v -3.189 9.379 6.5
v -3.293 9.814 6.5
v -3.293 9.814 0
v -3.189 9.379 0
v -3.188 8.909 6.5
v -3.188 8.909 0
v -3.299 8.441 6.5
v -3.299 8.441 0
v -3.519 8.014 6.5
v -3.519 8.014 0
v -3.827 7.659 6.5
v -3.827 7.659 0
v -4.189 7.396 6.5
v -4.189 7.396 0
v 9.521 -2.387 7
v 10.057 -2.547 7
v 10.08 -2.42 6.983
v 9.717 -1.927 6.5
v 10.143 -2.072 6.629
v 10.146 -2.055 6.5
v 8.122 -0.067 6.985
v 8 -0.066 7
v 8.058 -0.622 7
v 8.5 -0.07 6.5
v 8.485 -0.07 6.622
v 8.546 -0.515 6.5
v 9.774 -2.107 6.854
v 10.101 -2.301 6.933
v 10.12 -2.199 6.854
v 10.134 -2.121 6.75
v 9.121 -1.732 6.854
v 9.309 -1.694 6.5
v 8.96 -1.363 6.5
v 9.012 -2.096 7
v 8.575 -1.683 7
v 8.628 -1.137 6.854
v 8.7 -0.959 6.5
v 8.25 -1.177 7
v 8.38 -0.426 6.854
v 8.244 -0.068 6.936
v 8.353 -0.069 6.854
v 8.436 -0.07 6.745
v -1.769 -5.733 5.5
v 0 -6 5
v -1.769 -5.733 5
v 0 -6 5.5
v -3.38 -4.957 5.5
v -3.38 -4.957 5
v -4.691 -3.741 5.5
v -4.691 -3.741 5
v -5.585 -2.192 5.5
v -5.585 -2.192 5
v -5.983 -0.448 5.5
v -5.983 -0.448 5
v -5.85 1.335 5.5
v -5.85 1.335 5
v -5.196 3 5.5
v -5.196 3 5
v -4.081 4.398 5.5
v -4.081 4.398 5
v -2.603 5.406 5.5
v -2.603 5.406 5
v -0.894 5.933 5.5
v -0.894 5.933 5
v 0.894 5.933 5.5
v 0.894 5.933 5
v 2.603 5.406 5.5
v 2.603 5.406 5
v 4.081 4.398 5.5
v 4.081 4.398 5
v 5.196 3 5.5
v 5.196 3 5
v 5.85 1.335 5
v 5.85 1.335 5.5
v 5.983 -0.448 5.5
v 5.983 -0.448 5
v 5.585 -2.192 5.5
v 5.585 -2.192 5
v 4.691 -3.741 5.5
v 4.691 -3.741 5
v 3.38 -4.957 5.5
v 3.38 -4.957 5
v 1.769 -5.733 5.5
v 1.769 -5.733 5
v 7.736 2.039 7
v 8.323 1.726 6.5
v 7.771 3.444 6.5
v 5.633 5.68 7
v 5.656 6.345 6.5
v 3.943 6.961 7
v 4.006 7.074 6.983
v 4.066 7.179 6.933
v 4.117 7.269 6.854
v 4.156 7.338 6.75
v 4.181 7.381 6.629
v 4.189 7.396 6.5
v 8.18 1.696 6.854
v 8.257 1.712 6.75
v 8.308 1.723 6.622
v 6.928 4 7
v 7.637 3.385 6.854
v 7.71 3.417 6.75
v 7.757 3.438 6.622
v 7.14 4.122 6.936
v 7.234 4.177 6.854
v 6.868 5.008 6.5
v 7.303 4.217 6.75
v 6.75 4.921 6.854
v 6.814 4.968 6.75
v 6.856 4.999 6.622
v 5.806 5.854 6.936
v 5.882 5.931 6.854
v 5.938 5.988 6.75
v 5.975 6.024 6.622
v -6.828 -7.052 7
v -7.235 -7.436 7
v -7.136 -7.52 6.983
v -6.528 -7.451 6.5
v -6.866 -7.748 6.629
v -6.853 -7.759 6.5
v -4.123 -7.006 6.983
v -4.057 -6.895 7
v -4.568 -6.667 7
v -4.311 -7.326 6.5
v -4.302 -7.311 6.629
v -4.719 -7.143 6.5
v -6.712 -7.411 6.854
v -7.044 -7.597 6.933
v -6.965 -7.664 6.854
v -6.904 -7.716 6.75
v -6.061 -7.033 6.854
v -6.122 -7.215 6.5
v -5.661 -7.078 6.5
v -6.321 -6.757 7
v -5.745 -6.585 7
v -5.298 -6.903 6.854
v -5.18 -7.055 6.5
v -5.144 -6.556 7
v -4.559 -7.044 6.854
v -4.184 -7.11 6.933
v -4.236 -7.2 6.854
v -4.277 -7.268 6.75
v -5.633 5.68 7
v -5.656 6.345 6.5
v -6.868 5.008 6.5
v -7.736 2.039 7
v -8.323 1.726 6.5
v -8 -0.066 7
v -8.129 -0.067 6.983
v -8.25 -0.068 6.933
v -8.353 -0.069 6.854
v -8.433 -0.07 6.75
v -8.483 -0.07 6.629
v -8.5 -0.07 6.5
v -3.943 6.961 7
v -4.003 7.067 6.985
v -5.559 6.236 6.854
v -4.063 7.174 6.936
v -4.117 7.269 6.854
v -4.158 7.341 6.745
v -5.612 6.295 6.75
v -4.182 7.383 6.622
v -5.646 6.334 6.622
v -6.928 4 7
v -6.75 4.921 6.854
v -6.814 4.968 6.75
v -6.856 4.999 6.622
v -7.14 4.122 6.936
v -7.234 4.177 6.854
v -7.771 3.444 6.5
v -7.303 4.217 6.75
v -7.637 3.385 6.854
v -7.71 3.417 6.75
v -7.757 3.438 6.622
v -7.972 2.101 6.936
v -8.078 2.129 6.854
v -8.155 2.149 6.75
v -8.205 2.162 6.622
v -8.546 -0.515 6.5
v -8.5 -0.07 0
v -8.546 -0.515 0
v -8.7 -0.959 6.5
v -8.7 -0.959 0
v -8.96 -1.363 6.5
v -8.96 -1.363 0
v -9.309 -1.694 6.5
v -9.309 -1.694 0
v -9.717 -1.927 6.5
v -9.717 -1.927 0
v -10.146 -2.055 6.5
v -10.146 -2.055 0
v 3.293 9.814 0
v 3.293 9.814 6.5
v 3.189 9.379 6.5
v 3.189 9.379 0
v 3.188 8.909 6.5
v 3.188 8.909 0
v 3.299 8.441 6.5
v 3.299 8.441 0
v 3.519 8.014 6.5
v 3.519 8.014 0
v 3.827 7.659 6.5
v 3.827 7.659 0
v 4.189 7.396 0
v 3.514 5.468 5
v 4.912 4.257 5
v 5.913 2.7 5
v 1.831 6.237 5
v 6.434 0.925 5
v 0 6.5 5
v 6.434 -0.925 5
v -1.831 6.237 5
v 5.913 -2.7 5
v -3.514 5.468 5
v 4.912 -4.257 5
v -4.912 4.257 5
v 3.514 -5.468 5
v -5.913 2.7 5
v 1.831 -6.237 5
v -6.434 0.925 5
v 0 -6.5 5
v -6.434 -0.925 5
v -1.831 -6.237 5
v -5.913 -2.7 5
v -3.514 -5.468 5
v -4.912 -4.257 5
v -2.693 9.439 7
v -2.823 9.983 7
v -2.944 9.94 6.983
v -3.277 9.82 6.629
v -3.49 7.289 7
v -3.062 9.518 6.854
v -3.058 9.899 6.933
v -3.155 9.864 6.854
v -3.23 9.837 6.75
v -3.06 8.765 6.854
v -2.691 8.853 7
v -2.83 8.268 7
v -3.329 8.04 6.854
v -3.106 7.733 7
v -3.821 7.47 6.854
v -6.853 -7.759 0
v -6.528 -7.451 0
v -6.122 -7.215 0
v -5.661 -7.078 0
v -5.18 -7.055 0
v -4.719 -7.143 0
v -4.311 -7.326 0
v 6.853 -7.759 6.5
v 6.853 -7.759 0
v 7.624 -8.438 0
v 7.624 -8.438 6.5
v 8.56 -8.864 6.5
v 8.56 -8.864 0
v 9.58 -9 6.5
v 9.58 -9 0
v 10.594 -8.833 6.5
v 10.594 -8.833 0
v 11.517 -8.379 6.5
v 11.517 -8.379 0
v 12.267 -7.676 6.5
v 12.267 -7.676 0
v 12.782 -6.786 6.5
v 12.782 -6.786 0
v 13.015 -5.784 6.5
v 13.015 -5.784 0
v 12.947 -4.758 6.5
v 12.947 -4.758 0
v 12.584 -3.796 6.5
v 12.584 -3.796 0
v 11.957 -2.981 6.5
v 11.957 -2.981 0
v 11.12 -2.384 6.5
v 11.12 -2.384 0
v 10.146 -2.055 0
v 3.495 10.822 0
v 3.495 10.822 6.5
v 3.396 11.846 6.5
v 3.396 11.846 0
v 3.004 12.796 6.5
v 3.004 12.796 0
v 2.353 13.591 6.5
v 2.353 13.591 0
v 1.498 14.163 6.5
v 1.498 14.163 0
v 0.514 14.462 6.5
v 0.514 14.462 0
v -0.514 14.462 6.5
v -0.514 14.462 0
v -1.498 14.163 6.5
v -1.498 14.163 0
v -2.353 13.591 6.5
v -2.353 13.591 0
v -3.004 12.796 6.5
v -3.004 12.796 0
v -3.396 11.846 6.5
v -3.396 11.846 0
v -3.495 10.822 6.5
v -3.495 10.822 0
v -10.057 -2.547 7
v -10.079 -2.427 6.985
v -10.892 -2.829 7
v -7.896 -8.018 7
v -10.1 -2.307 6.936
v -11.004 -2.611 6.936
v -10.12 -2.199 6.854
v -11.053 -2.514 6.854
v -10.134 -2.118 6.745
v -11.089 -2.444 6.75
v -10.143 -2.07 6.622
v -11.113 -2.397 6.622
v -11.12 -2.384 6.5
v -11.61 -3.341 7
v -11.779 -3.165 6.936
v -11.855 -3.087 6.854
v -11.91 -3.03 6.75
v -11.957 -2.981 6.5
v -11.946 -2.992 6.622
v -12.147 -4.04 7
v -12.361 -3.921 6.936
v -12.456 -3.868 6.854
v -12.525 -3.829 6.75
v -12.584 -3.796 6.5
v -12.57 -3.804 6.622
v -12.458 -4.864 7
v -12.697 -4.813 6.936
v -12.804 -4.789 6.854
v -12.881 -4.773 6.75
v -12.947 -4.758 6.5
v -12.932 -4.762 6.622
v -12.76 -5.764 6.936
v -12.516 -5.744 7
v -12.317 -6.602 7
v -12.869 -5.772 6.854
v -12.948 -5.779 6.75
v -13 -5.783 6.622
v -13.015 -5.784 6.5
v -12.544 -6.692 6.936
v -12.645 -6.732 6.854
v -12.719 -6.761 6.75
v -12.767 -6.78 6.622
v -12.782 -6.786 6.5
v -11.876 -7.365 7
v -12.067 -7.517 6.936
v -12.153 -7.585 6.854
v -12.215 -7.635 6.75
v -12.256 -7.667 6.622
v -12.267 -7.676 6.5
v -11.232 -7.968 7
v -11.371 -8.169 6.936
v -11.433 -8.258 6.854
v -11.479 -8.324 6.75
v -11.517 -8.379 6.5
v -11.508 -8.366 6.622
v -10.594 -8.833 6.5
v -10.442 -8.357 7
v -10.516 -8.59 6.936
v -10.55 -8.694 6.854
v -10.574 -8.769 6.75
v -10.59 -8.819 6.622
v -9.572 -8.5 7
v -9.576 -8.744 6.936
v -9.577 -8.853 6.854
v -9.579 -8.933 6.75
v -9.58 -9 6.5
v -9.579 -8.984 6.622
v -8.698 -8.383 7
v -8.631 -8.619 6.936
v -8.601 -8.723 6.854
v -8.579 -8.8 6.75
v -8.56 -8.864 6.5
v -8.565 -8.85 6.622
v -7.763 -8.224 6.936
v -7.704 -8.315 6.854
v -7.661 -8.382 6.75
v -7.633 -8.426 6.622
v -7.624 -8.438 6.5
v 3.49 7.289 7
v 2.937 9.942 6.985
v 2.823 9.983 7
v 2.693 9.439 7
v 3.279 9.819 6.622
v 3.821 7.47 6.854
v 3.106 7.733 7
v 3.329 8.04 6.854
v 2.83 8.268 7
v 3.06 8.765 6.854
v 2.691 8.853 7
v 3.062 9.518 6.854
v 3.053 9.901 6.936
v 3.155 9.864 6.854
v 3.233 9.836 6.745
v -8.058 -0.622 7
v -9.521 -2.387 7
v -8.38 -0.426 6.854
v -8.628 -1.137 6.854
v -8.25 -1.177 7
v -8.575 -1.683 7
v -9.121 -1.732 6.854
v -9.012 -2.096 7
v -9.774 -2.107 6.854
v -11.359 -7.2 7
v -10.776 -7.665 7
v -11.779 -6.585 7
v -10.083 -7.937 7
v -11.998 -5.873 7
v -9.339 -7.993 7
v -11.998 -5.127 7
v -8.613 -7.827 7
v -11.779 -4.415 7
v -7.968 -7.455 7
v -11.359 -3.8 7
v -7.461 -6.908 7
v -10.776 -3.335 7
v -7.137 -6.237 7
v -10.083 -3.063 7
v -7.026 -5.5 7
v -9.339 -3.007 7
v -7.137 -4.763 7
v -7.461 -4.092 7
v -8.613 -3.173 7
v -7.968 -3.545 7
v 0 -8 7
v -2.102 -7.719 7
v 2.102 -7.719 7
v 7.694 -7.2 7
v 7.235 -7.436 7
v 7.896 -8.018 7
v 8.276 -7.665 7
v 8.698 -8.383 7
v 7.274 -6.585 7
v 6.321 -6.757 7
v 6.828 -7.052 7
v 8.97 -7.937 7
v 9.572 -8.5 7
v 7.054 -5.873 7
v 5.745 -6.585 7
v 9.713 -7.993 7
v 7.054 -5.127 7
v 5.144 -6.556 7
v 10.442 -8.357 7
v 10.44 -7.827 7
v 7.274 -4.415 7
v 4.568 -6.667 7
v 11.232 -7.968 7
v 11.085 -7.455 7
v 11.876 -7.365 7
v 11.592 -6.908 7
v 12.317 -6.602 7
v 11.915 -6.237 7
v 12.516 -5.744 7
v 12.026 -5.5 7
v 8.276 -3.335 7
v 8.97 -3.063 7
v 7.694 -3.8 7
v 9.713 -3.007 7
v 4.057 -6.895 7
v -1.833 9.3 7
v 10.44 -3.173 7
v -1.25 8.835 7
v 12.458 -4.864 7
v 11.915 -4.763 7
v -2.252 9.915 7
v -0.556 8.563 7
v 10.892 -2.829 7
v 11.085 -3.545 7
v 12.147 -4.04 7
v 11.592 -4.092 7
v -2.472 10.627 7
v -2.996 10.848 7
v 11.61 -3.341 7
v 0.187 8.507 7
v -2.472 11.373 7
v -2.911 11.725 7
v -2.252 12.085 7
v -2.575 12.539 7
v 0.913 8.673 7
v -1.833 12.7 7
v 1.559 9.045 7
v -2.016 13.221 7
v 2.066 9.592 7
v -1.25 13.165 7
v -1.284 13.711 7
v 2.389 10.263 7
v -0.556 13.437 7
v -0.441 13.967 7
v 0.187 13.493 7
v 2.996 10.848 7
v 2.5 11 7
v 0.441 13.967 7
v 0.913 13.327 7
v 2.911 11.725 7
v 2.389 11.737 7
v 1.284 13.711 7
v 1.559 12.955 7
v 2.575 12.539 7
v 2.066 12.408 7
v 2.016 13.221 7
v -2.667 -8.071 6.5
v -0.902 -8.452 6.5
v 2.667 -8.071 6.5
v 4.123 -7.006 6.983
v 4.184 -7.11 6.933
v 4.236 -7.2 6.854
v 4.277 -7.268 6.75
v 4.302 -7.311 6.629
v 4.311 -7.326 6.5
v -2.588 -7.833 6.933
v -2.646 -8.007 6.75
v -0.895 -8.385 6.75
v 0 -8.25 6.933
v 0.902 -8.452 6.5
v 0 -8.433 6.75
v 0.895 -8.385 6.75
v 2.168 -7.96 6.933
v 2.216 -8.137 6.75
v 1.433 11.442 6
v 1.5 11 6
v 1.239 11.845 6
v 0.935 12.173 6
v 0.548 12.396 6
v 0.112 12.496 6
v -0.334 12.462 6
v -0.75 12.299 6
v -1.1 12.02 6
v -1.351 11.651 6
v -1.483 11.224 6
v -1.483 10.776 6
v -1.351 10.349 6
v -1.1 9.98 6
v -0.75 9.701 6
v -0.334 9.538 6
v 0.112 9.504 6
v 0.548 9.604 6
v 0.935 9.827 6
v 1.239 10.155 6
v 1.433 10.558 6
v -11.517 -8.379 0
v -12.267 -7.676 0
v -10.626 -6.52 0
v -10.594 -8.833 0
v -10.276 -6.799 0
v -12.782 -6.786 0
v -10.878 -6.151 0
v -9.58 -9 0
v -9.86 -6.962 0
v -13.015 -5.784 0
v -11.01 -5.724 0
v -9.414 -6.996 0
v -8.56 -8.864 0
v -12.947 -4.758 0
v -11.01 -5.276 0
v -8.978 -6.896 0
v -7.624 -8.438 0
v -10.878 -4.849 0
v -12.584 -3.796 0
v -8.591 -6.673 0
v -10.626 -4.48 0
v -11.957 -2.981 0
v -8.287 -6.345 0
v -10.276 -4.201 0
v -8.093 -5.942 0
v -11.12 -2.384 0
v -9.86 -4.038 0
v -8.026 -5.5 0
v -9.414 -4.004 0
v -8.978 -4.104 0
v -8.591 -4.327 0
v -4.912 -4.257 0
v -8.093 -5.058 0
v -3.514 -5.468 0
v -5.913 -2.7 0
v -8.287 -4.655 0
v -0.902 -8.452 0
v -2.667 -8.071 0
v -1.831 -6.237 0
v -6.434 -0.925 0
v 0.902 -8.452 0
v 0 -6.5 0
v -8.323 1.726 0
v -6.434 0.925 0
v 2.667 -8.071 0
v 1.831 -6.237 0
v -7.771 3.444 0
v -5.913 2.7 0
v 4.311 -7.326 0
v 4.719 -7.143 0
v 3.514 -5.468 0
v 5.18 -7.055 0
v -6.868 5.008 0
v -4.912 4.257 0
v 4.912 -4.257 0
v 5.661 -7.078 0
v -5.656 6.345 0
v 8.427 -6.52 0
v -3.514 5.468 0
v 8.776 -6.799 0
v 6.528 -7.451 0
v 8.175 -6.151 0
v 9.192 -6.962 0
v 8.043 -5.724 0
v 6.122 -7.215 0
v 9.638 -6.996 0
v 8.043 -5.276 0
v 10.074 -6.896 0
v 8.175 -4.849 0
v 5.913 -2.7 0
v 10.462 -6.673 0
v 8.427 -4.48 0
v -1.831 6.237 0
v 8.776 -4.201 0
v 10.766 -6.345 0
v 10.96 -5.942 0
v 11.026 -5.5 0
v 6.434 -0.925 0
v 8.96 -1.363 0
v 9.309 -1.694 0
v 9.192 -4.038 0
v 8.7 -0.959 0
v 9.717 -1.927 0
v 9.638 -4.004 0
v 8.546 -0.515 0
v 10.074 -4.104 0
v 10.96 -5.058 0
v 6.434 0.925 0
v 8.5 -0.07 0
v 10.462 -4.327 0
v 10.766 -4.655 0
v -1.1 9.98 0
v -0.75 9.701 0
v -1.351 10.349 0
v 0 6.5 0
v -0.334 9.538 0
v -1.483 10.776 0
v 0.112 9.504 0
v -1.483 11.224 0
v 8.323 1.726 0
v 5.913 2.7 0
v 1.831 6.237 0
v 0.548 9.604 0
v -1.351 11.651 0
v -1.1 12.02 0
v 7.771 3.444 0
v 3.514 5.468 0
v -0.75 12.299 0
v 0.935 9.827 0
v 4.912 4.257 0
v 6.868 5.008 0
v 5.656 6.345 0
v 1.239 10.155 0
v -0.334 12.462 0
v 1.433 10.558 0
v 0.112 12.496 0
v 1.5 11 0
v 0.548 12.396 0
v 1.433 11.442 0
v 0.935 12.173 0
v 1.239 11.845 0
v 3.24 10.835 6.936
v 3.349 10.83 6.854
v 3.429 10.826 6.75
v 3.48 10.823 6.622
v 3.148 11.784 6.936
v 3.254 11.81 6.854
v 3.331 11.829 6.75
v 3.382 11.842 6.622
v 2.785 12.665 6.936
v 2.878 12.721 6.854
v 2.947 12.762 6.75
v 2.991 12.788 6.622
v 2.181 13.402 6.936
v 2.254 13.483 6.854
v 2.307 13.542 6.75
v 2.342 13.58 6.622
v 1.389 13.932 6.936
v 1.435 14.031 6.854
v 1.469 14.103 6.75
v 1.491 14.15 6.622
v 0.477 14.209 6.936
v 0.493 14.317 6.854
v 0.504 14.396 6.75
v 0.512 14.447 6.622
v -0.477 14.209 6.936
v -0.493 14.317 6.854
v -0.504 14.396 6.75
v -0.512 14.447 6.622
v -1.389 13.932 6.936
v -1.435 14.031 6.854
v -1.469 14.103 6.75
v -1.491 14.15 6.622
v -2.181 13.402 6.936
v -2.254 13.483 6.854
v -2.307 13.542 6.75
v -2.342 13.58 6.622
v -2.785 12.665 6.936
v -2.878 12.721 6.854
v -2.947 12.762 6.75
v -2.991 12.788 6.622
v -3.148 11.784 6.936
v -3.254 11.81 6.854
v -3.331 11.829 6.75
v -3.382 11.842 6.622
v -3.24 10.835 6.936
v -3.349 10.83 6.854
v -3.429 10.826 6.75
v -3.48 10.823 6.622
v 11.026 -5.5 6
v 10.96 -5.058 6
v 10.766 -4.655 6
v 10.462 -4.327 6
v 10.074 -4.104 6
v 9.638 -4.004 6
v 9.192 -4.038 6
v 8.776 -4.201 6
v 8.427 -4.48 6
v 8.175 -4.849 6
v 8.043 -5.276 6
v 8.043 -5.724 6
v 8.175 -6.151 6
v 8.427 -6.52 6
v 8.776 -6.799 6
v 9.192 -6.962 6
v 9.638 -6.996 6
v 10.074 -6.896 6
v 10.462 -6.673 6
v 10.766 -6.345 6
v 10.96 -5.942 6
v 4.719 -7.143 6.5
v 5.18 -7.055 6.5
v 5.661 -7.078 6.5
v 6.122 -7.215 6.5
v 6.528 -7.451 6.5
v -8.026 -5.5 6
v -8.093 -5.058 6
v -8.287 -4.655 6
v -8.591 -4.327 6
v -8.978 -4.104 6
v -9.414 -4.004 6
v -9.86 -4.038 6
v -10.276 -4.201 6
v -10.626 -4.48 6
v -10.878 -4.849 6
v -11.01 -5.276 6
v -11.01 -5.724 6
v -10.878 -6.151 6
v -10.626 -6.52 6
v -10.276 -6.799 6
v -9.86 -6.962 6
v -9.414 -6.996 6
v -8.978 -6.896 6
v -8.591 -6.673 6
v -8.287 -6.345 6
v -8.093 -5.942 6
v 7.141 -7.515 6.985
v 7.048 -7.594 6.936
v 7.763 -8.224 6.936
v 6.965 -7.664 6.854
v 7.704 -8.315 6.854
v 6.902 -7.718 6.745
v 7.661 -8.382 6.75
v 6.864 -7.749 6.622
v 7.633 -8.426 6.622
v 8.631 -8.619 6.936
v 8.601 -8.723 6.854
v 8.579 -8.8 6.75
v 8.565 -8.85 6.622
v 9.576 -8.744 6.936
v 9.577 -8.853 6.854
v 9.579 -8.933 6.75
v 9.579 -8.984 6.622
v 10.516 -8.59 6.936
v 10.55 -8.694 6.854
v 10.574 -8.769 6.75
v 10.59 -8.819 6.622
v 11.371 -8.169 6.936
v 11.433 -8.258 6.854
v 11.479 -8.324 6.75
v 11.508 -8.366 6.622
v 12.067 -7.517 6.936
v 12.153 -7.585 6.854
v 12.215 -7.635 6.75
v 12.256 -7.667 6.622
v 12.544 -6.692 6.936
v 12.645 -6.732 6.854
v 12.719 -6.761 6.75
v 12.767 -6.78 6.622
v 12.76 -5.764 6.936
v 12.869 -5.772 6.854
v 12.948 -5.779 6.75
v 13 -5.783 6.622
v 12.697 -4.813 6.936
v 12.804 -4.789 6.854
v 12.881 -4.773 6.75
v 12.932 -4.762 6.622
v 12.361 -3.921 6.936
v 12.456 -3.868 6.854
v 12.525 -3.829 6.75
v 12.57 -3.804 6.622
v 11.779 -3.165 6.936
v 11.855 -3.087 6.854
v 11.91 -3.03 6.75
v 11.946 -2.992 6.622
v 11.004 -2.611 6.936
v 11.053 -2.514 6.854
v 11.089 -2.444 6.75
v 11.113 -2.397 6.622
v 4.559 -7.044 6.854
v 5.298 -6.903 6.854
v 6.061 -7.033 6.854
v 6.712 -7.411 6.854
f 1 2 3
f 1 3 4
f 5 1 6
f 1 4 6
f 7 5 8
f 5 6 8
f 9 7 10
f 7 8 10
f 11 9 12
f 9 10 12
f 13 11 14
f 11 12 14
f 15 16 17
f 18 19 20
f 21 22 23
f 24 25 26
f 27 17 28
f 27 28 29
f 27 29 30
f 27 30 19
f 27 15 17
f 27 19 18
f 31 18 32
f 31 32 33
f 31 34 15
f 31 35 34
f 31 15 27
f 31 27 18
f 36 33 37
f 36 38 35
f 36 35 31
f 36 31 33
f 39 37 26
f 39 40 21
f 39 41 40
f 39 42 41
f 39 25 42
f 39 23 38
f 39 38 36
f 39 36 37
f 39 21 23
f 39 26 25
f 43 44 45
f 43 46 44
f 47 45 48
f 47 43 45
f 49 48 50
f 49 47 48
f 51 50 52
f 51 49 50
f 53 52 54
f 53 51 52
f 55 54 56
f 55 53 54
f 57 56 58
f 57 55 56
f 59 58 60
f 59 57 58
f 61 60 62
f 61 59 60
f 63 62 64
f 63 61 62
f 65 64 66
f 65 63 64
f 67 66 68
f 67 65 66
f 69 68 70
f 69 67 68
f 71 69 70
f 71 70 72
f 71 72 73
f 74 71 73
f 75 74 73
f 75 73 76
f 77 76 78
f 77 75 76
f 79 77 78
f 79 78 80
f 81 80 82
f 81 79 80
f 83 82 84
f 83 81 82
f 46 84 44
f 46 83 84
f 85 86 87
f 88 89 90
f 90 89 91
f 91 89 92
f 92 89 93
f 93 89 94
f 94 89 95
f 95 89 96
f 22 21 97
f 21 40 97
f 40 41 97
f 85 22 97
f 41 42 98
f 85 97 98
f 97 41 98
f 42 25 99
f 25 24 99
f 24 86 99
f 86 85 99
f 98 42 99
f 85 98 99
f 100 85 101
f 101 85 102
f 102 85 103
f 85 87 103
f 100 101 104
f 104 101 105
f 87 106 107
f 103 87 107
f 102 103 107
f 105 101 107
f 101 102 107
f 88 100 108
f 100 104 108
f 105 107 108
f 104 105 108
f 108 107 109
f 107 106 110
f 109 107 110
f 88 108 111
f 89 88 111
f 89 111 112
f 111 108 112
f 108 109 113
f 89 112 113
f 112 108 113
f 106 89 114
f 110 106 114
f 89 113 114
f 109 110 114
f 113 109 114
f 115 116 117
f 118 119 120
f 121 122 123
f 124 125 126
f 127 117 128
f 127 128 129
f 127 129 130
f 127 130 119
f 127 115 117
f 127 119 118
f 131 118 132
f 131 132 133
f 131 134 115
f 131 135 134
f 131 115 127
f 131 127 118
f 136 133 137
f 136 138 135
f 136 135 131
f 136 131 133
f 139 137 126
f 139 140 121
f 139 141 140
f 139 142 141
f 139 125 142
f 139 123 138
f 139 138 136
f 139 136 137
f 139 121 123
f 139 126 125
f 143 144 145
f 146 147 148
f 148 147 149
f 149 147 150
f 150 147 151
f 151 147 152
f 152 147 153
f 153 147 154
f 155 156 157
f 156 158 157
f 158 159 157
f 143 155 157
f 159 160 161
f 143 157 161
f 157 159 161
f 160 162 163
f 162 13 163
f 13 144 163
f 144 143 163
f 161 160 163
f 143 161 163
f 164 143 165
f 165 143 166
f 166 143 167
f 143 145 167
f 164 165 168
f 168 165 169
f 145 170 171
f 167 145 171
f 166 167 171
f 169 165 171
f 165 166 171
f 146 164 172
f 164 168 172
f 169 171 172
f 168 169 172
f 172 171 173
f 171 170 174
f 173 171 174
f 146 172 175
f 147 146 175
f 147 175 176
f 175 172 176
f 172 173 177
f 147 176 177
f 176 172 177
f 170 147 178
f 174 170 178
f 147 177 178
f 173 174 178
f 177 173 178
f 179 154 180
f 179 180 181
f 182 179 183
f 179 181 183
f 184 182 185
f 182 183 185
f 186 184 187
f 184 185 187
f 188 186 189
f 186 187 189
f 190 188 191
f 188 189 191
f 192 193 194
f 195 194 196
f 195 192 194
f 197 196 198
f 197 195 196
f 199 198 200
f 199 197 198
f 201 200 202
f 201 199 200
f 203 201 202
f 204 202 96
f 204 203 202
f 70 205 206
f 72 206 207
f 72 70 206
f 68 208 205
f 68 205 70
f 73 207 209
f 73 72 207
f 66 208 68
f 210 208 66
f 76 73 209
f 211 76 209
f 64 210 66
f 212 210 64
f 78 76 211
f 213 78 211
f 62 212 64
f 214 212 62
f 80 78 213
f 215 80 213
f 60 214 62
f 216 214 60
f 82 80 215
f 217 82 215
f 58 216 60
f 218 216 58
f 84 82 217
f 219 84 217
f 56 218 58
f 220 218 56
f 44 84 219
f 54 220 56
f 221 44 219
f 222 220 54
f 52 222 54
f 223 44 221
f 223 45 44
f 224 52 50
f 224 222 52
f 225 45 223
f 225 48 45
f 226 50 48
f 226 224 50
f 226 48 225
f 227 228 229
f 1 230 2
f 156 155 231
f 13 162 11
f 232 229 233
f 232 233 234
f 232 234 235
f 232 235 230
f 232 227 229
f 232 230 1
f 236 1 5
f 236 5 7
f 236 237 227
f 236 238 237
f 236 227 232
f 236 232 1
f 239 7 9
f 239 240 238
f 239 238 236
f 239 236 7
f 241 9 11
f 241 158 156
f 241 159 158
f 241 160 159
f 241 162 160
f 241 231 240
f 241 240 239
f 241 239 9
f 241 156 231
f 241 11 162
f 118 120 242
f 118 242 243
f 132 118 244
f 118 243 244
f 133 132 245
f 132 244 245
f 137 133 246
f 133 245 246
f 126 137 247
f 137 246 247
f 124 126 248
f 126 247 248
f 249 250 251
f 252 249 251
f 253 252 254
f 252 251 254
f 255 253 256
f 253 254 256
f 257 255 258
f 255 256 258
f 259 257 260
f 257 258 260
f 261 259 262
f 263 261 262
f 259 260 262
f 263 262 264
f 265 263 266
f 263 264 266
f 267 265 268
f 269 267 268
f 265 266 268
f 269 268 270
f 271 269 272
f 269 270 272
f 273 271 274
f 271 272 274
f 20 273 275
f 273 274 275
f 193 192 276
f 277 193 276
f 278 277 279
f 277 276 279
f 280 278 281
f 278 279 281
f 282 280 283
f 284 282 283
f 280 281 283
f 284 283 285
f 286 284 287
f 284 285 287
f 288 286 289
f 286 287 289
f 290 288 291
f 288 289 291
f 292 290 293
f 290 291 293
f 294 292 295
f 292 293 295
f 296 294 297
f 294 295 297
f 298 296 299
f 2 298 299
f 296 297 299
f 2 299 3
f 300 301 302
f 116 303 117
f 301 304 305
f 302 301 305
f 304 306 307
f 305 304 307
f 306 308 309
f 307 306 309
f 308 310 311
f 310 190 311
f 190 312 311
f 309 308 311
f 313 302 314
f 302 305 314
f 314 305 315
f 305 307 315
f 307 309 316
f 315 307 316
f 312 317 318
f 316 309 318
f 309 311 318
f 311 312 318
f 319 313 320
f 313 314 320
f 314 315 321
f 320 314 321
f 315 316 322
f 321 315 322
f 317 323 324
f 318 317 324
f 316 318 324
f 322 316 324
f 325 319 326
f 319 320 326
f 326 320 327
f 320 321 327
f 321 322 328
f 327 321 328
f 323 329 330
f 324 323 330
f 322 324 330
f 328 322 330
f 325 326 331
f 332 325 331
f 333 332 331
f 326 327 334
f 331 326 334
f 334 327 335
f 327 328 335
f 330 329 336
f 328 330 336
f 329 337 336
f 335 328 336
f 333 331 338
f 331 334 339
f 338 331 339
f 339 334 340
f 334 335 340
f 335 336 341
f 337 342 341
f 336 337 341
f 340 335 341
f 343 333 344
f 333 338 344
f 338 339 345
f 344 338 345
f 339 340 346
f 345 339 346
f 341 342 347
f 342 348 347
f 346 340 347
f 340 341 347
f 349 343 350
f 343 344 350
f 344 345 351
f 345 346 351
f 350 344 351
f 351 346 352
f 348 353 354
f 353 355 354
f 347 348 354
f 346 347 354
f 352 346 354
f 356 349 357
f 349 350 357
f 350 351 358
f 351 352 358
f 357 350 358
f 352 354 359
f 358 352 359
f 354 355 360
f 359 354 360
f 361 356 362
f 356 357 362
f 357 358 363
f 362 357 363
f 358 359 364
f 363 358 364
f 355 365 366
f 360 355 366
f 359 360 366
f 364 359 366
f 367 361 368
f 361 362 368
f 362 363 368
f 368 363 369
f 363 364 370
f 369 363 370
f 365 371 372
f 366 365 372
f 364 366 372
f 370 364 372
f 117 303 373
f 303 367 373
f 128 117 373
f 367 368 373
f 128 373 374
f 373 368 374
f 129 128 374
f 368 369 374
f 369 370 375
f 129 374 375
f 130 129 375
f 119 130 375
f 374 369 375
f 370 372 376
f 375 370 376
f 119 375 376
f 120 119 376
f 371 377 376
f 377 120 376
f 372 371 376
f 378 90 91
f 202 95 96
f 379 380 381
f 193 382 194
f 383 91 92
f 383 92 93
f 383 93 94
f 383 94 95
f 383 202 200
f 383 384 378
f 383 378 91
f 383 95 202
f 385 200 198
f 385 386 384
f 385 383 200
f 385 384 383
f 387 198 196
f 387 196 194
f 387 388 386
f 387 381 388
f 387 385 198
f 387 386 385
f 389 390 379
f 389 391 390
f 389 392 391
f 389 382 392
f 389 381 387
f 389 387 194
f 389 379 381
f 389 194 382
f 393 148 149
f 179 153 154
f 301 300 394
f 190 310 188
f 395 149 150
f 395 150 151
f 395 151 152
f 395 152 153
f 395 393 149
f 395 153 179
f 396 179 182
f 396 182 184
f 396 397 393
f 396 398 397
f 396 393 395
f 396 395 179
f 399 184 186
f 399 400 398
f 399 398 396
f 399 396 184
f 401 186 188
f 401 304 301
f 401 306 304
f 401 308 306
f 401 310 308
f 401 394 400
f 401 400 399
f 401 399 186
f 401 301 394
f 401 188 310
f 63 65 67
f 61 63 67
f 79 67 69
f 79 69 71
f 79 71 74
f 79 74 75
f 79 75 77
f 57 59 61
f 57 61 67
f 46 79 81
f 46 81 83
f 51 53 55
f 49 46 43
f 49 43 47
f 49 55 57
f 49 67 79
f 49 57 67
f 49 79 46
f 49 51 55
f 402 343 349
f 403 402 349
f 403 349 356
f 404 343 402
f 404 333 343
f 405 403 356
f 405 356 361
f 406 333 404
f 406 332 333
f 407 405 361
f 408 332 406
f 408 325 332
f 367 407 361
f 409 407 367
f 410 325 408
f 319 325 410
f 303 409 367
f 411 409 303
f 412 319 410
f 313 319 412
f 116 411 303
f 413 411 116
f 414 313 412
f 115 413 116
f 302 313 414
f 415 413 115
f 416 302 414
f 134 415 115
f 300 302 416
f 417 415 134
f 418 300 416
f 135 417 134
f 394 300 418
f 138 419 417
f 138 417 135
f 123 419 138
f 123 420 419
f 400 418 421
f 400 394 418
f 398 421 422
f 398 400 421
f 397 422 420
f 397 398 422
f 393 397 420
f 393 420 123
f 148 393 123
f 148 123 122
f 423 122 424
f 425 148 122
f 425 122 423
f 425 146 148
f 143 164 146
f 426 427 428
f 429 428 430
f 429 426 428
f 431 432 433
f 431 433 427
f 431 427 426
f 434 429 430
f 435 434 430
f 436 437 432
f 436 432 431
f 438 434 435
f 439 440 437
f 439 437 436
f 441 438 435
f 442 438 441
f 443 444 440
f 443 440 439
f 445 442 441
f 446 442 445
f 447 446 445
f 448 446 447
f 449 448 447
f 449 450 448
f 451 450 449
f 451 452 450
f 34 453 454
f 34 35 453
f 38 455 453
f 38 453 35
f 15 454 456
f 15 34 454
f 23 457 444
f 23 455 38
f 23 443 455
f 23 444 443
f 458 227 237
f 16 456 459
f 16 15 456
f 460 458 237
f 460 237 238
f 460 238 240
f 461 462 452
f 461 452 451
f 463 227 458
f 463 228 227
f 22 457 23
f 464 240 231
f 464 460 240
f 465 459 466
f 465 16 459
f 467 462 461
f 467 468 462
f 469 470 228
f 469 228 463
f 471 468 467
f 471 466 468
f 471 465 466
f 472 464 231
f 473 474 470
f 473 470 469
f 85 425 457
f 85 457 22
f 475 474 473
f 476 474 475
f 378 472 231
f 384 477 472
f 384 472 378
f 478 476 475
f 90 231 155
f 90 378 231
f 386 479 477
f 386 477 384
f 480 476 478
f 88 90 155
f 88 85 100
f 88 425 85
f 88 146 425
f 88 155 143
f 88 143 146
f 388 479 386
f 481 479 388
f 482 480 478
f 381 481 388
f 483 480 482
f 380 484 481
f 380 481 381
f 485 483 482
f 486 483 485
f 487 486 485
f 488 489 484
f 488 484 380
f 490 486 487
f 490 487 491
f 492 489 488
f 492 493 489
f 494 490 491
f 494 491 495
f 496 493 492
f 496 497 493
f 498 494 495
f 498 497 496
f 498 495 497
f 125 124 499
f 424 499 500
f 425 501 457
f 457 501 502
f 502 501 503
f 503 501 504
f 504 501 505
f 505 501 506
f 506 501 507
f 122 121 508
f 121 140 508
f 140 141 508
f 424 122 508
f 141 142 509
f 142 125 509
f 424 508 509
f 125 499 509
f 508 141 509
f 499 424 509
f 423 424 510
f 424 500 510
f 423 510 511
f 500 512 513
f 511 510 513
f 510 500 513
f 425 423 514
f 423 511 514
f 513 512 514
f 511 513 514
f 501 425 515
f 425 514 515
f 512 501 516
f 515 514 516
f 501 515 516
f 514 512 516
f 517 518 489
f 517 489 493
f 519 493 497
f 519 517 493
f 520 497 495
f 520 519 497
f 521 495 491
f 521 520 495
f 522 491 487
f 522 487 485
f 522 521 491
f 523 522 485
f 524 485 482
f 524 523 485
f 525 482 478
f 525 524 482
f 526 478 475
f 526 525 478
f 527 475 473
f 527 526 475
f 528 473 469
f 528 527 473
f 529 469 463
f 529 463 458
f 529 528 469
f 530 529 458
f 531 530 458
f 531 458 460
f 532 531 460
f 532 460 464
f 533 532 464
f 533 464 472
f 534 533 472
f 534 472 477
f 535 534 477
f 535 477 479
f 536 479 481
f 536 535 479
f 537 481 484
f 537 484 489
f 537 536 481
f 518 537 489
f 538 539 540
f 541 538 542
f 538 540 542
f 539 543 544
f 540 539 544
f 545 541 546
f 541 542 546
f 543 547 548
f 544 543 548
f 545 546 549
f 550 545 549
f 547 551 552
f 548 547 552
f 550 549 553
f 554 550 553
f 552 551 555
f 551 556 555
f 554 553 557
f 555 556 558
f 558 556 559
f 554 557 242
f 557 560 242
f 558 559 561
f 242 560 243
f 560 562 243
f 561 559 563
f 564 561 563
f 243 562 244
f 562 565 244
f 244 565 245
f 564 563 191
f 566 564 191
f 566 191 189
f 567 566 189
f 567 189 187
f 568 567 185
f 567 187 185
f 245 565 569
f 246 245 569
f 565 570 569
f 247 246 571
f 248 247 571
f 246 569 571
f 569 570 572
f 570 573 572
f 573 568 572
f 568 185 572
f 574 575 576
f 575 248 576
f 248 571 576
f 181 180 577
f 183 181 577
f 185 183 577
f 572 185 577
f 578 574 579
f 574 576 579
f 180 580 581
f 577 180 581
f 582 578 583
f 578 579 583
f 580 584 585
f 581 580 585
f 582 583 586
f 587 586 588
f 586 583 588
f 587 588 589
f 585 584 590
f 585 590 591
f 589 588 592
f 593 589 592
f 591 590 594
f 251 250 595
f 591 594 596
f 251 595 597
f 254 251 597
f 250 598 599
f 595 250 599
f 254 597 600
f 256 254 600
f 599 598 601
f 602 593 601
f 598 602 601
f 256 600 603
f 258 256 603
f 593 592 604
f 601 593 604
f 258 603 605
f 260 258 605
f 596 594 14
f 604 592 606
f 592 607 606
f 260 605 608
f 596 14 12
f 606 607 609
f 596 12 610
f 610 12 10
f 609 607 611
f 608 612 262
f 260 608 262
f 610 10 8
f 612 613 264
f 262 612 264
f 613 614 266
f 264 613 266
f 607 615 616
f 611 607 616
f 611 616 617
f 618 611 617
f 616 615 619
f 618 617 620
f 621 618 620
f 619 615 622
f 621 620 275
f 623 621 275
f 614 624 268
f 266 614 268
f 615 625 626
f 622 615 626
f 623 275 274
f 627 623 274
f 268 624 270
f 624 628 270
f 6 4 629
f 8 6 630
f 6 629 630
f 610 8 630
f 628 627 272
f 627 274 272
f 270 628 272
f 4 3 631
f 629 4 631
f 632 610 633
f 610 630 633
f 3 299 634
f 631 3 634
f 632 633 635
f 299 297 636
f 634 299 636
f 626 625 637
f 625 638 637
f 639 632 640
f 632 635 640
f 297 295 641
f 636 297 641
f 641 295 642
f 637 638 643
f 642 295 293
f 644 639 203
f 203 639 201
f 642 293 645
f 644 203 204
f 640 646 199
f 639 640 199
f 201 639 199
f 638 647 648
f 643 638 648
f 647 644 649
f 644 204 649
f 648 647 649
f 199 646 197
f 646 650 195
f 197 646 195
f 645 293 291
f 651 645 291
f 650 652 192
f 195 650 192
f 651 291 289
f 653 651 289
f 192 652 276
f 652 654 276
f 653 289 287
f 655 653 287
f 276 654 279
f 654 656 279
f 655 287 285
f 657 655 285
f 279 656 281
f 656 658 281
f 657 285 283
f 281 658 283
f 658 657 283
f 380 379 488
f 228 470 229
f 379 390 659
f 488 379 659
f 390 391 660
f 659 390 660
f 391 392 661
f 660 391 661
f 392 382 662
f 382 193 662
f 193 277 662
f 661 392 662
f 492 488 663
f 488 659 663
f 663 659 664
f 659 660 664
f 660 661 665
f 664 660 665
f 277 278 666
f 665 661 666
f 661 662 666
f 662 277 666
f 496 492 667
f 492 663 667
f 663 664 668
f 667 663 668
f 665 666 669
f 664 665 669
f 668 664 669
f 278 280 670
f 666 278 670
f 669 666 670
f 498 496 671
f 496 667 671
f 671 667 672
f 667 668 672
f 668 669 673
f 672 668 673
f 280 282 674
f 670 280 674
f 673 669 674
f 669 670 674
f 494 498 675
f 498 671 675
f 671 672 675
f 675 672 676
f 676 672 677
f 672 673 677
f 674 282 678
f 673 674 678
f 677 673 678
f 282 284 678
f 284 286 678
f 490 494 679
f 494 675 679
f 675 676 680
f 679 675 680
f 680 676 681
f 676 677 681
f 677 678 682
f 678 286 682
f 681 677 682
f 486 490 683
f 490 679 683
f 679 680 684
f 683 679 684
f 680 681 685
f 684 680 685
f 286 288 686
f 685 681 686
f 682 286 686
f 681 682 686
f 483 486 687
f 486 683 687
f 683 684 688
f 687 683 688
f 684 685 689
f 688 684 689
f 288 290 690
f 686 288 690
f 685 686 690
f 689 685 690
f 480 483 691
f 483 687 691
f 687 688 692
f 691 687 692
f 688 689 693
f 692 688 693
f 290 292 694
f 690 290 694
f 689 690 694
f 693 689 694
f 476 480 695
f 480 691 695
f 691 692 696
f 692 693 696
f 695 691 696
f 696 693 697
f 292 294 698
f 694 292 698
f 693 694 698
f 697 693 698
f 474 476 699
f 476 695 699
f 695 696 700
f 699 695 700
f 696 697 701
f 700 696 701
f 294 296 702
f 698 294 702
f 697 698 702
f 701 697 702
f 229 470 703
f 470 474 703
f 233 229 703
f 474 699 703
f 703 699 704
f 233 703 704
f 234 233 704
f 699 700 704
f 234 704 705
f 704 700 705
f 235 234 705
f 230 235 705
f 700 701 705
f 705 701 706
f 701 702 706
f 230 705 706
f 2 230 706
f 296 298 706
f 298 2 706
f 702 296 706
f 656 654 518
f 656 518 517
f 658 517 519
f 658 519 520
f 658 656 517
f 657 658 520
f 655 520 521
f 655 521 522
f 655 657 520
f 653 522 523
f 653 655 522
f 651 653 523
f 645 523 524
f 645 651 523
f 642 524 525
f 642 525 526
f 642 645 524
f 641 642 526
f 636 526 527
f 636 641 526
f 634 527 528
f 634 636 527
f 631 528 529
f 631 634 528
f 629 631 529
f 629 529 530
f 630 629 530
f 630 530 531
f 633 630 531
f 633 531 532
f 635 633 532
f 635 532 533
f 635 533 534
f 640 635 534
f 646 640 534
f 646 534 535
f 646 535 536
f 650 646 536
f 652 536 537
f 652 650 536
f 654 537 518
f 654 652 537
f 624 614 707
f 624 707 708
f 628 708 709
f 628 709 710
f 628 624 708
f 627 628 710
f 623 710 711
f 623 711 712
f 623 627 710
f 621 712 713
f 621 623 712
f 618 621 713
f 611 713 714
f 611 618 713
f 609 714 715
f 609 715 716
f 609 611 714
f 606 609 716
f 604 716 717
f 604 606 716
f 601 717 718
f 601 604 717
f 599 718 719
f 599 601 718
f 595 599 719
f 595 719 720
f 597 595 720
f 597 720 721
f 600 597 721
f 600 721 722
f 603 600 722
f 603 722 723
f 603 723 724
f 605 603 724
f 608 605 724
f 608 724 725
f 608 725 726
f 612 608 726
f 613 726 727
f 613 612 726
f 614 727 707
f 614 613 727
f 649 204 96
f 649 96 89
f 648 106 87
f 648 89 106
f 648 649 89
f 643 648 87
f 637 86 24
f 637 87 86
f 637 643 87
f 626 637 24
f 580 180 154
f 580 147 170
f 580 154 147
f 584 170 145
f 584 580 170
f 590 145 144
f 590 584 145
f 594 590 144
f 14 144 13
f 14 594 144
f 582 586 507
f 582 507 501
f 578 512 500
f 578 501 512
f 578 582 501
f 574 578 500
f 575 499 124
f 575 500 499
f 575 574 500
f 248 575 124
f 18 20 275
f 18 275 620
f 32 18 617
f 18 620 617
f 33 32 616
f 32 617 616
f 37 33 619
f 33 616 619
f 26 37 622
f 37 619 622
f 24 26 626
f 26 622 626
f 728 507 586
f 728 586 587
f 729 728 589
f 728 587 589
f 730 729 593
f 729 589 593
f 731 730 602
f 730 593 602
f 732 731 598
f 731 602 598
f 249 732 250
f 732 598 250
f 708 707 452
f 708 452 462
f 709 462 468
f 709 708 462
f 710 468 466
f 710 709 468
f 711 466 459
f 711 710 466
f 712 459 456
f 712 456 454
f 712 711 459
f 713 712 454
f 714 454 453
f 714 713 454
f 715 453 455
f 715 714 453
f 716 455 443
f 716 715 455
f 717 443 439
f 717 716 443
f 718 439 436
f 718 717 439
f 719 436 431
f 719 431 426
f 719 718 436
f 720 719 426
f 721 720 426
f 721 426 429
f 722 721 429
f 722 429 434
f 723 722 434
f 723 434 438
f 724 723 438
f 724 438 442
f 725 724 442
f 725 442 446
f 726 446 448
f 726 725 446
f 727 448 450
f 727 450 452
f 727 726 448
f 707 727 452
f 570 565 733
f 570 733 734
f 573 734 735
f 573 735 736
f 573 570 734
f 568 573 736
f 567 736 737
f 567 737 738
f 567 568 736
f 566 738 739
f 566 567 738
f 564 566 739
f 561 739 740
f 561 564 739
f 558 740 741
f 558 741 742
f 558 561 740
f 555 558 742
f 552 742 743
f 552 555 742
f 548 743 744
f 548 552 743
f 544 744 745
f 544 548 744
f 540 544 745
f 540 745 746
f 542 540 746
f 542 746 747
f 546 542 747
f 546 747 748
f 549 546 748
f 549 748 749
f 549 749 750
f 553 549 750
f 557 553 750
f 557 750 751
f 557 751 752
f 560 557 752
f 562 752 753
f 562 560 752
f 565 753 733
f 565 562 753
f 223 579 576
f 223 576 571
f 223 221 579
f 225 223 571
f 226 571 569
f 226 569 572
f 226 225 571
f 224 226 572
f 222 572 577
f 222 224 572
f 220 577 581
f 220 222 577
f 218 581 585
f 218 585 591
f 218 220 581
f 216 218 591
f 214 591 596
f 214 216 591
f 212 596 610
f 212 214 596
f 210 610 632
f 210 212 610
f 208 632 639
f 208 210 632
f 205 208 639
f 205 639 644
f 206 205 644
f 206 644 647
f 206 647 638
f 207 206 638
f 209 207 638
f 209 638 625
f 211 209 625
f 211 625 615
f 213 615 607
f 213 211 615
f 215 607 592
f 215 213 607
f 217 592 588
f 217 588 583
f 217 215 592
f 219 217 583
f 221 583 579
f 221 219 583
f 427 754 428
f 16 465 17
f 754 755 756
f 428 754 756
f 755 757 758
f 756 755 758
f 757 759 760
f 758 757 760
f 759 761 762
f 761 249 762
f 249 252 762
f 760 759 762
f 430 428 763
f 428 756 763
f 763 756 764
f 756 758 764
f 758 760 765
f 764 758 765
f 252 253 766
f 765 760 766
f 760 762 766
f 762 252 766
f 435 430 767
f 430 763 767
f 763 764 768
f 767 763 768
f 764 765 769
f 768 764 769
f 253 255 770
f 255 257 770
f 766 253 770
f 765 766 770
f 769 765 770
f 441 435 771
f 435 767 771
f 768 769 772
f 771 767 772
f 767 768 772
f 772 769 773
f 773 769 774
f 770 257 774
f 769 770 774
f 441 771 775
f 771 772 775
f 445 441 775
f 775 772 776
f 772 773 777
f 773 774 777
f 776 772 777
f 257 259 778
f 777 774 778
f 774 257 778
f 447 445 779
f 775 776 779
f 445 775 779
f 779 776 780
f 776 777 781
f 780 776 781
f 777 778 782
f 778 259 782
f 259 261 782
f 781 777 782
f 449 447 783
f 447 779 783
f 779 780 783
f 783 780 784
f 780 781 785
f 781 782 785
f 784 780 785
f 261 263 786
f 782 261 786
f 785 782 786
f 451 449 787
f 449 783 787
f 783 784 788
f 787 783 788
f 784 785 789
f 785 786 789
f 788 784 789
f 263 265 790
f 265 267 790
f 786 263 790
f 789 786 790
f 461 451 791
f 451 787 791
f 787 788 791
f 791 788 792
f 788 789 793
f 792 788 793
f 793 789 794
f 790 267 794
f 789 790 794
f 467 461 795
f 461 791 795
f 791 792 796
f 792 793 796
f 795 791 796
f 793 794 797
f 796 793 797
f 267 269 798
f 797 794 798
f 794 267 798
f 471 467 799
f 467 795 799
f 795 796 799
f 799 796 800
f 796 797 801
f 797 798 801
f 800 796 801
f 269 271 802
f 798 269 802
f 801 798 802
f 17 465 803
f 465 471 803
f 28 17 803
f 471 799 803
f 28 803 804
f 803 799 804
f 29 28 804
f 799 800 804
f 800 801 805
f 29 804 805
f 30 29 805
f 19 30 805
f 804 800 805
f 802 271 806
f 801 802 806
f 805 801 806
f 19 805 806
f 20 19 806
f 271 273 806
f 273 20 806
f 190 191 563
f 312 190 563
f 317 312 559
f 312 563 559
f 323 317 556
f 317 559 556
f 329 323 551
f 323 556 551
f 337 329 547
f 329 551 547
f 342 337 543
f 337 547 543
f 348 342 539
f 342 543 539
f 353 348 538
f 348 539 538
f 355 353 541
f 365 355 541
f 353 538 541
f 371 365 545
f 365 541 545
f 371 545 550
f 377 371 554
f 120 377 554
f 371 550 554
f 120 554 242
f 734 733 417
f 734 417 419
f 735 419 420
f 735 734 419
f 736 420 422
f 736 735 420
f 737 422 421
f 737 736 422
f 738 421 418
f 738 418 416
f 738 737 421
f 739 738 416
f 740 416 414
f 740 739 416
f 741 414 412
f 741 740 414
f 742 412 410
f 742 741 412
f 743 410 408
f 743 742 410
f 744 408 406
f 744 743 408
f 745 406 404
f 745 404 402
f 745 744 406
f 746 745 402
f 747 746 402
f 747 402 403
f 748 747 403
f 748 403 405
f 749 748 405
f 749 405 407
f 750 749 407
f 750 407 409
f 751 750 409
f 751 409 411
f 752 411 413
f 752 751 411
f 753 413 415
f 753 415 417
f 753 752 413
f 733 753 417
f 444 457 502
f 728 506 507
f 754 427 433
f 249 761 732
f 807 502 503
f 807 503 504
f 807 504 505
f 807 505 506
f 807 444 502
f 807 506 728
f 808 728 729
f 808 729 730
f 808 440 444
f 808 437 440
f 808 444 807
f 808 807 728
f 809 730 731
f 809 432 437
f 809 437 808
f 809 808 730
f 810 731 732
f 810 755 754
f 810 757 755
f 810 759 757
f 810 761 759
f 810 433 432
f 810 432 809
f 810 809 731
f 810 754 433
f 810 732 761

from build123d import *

# Parameters (mm, degrees)
F2_R     = 3.5
F2_R_2   = 1.5
F3_DEPTH = 7
F4_SIZE  = 1
F5_R     = 2
F6_R     = 0.5


with BuildPart() as f1:
    # F0 (on Right) → F1 (revolve)
    with BuildSketch(Plane.YZ):
        Polygon((-8.5, 7), (-8.5, 0), (-6.5, 0), (-6.5, 5), (-6, 5), (-6, 5.5), (0, 5.5), (0, 7), align=None)
    revolve(axis=Axis((0, 0, 6.25), (0, 0, -1)))

    # F2 (on Top) → F3 (join)
    with BuildSketch(Plane.XY):
        with Locations((0, 11)):
            Circle(F2_R)
        with Locations((0, 11)):
            Circle(F2_R_2, mode=Mode.SUBTRACT)
        with Locations((-9.5262794416, -5.5)):
            Circle(F2_R)
        with Locations((-9.5262794416, -5.5)):
            Circle(F2_R_2, mode=Mode.SUBTRACT)
        with Locations((9.5262794416, -5.5)):
            Circle(F2_R)
        with Locations((9.5262794416, -5.5)):
            Circle(F2_R_2, mode=Mode.SUBTRACT)
    extrude(amount=F3_DEPTH)

    # F4
    f4_edges = [f1.edges().sort_by_distance(p)[0] for p in [
        (-1.5, 11, 7),
        (-11.026279, -5.5, 7),
        (8.026279, -5.5, 7),
    ]]
    chamfer(f4_edges, length=F4_SIZE)

    # F5
    f5_edges = [f1.edges().sort_by_distance(p)[0] for p in [
        (-2.13588, 8.227273, 3.5),
        (2.13588, 8.227273, 3.5),
        (-6.057087, -5.963363, 3.5),
        (-8.192967, -2.26391, 3.5),
        (6.057087, -5.963363, 3.5),
        (8.192967, -2.26391, 3.5),
    ]]
    fillet(f5_edges, radius=F5_R)

    # F6
    f6_edges = [f1.edges().sort_by_distance(p)[0] for p in [
        (0, -8.5, 7),
        (-5.660825, -7.077944, 7),
        (-8.960092, -1.363447, 7),
        (-12.557368, -7.25, 7),
        (-7.361216, 4.25, 7),
        (-3.299266, 8.44139, 7),
        (3.299266, 8.44139, 7),
        (0, 14.5, 7),
        (7.361216, 4.25, 7),
        (5.660825, -7.077944, 7),
        (8.960092, -1.363447, 7),
        (12.557368, -7.25, 7),
    ]]
    fillet(f6_edges, radius=F6_R)


solid = f1.part
